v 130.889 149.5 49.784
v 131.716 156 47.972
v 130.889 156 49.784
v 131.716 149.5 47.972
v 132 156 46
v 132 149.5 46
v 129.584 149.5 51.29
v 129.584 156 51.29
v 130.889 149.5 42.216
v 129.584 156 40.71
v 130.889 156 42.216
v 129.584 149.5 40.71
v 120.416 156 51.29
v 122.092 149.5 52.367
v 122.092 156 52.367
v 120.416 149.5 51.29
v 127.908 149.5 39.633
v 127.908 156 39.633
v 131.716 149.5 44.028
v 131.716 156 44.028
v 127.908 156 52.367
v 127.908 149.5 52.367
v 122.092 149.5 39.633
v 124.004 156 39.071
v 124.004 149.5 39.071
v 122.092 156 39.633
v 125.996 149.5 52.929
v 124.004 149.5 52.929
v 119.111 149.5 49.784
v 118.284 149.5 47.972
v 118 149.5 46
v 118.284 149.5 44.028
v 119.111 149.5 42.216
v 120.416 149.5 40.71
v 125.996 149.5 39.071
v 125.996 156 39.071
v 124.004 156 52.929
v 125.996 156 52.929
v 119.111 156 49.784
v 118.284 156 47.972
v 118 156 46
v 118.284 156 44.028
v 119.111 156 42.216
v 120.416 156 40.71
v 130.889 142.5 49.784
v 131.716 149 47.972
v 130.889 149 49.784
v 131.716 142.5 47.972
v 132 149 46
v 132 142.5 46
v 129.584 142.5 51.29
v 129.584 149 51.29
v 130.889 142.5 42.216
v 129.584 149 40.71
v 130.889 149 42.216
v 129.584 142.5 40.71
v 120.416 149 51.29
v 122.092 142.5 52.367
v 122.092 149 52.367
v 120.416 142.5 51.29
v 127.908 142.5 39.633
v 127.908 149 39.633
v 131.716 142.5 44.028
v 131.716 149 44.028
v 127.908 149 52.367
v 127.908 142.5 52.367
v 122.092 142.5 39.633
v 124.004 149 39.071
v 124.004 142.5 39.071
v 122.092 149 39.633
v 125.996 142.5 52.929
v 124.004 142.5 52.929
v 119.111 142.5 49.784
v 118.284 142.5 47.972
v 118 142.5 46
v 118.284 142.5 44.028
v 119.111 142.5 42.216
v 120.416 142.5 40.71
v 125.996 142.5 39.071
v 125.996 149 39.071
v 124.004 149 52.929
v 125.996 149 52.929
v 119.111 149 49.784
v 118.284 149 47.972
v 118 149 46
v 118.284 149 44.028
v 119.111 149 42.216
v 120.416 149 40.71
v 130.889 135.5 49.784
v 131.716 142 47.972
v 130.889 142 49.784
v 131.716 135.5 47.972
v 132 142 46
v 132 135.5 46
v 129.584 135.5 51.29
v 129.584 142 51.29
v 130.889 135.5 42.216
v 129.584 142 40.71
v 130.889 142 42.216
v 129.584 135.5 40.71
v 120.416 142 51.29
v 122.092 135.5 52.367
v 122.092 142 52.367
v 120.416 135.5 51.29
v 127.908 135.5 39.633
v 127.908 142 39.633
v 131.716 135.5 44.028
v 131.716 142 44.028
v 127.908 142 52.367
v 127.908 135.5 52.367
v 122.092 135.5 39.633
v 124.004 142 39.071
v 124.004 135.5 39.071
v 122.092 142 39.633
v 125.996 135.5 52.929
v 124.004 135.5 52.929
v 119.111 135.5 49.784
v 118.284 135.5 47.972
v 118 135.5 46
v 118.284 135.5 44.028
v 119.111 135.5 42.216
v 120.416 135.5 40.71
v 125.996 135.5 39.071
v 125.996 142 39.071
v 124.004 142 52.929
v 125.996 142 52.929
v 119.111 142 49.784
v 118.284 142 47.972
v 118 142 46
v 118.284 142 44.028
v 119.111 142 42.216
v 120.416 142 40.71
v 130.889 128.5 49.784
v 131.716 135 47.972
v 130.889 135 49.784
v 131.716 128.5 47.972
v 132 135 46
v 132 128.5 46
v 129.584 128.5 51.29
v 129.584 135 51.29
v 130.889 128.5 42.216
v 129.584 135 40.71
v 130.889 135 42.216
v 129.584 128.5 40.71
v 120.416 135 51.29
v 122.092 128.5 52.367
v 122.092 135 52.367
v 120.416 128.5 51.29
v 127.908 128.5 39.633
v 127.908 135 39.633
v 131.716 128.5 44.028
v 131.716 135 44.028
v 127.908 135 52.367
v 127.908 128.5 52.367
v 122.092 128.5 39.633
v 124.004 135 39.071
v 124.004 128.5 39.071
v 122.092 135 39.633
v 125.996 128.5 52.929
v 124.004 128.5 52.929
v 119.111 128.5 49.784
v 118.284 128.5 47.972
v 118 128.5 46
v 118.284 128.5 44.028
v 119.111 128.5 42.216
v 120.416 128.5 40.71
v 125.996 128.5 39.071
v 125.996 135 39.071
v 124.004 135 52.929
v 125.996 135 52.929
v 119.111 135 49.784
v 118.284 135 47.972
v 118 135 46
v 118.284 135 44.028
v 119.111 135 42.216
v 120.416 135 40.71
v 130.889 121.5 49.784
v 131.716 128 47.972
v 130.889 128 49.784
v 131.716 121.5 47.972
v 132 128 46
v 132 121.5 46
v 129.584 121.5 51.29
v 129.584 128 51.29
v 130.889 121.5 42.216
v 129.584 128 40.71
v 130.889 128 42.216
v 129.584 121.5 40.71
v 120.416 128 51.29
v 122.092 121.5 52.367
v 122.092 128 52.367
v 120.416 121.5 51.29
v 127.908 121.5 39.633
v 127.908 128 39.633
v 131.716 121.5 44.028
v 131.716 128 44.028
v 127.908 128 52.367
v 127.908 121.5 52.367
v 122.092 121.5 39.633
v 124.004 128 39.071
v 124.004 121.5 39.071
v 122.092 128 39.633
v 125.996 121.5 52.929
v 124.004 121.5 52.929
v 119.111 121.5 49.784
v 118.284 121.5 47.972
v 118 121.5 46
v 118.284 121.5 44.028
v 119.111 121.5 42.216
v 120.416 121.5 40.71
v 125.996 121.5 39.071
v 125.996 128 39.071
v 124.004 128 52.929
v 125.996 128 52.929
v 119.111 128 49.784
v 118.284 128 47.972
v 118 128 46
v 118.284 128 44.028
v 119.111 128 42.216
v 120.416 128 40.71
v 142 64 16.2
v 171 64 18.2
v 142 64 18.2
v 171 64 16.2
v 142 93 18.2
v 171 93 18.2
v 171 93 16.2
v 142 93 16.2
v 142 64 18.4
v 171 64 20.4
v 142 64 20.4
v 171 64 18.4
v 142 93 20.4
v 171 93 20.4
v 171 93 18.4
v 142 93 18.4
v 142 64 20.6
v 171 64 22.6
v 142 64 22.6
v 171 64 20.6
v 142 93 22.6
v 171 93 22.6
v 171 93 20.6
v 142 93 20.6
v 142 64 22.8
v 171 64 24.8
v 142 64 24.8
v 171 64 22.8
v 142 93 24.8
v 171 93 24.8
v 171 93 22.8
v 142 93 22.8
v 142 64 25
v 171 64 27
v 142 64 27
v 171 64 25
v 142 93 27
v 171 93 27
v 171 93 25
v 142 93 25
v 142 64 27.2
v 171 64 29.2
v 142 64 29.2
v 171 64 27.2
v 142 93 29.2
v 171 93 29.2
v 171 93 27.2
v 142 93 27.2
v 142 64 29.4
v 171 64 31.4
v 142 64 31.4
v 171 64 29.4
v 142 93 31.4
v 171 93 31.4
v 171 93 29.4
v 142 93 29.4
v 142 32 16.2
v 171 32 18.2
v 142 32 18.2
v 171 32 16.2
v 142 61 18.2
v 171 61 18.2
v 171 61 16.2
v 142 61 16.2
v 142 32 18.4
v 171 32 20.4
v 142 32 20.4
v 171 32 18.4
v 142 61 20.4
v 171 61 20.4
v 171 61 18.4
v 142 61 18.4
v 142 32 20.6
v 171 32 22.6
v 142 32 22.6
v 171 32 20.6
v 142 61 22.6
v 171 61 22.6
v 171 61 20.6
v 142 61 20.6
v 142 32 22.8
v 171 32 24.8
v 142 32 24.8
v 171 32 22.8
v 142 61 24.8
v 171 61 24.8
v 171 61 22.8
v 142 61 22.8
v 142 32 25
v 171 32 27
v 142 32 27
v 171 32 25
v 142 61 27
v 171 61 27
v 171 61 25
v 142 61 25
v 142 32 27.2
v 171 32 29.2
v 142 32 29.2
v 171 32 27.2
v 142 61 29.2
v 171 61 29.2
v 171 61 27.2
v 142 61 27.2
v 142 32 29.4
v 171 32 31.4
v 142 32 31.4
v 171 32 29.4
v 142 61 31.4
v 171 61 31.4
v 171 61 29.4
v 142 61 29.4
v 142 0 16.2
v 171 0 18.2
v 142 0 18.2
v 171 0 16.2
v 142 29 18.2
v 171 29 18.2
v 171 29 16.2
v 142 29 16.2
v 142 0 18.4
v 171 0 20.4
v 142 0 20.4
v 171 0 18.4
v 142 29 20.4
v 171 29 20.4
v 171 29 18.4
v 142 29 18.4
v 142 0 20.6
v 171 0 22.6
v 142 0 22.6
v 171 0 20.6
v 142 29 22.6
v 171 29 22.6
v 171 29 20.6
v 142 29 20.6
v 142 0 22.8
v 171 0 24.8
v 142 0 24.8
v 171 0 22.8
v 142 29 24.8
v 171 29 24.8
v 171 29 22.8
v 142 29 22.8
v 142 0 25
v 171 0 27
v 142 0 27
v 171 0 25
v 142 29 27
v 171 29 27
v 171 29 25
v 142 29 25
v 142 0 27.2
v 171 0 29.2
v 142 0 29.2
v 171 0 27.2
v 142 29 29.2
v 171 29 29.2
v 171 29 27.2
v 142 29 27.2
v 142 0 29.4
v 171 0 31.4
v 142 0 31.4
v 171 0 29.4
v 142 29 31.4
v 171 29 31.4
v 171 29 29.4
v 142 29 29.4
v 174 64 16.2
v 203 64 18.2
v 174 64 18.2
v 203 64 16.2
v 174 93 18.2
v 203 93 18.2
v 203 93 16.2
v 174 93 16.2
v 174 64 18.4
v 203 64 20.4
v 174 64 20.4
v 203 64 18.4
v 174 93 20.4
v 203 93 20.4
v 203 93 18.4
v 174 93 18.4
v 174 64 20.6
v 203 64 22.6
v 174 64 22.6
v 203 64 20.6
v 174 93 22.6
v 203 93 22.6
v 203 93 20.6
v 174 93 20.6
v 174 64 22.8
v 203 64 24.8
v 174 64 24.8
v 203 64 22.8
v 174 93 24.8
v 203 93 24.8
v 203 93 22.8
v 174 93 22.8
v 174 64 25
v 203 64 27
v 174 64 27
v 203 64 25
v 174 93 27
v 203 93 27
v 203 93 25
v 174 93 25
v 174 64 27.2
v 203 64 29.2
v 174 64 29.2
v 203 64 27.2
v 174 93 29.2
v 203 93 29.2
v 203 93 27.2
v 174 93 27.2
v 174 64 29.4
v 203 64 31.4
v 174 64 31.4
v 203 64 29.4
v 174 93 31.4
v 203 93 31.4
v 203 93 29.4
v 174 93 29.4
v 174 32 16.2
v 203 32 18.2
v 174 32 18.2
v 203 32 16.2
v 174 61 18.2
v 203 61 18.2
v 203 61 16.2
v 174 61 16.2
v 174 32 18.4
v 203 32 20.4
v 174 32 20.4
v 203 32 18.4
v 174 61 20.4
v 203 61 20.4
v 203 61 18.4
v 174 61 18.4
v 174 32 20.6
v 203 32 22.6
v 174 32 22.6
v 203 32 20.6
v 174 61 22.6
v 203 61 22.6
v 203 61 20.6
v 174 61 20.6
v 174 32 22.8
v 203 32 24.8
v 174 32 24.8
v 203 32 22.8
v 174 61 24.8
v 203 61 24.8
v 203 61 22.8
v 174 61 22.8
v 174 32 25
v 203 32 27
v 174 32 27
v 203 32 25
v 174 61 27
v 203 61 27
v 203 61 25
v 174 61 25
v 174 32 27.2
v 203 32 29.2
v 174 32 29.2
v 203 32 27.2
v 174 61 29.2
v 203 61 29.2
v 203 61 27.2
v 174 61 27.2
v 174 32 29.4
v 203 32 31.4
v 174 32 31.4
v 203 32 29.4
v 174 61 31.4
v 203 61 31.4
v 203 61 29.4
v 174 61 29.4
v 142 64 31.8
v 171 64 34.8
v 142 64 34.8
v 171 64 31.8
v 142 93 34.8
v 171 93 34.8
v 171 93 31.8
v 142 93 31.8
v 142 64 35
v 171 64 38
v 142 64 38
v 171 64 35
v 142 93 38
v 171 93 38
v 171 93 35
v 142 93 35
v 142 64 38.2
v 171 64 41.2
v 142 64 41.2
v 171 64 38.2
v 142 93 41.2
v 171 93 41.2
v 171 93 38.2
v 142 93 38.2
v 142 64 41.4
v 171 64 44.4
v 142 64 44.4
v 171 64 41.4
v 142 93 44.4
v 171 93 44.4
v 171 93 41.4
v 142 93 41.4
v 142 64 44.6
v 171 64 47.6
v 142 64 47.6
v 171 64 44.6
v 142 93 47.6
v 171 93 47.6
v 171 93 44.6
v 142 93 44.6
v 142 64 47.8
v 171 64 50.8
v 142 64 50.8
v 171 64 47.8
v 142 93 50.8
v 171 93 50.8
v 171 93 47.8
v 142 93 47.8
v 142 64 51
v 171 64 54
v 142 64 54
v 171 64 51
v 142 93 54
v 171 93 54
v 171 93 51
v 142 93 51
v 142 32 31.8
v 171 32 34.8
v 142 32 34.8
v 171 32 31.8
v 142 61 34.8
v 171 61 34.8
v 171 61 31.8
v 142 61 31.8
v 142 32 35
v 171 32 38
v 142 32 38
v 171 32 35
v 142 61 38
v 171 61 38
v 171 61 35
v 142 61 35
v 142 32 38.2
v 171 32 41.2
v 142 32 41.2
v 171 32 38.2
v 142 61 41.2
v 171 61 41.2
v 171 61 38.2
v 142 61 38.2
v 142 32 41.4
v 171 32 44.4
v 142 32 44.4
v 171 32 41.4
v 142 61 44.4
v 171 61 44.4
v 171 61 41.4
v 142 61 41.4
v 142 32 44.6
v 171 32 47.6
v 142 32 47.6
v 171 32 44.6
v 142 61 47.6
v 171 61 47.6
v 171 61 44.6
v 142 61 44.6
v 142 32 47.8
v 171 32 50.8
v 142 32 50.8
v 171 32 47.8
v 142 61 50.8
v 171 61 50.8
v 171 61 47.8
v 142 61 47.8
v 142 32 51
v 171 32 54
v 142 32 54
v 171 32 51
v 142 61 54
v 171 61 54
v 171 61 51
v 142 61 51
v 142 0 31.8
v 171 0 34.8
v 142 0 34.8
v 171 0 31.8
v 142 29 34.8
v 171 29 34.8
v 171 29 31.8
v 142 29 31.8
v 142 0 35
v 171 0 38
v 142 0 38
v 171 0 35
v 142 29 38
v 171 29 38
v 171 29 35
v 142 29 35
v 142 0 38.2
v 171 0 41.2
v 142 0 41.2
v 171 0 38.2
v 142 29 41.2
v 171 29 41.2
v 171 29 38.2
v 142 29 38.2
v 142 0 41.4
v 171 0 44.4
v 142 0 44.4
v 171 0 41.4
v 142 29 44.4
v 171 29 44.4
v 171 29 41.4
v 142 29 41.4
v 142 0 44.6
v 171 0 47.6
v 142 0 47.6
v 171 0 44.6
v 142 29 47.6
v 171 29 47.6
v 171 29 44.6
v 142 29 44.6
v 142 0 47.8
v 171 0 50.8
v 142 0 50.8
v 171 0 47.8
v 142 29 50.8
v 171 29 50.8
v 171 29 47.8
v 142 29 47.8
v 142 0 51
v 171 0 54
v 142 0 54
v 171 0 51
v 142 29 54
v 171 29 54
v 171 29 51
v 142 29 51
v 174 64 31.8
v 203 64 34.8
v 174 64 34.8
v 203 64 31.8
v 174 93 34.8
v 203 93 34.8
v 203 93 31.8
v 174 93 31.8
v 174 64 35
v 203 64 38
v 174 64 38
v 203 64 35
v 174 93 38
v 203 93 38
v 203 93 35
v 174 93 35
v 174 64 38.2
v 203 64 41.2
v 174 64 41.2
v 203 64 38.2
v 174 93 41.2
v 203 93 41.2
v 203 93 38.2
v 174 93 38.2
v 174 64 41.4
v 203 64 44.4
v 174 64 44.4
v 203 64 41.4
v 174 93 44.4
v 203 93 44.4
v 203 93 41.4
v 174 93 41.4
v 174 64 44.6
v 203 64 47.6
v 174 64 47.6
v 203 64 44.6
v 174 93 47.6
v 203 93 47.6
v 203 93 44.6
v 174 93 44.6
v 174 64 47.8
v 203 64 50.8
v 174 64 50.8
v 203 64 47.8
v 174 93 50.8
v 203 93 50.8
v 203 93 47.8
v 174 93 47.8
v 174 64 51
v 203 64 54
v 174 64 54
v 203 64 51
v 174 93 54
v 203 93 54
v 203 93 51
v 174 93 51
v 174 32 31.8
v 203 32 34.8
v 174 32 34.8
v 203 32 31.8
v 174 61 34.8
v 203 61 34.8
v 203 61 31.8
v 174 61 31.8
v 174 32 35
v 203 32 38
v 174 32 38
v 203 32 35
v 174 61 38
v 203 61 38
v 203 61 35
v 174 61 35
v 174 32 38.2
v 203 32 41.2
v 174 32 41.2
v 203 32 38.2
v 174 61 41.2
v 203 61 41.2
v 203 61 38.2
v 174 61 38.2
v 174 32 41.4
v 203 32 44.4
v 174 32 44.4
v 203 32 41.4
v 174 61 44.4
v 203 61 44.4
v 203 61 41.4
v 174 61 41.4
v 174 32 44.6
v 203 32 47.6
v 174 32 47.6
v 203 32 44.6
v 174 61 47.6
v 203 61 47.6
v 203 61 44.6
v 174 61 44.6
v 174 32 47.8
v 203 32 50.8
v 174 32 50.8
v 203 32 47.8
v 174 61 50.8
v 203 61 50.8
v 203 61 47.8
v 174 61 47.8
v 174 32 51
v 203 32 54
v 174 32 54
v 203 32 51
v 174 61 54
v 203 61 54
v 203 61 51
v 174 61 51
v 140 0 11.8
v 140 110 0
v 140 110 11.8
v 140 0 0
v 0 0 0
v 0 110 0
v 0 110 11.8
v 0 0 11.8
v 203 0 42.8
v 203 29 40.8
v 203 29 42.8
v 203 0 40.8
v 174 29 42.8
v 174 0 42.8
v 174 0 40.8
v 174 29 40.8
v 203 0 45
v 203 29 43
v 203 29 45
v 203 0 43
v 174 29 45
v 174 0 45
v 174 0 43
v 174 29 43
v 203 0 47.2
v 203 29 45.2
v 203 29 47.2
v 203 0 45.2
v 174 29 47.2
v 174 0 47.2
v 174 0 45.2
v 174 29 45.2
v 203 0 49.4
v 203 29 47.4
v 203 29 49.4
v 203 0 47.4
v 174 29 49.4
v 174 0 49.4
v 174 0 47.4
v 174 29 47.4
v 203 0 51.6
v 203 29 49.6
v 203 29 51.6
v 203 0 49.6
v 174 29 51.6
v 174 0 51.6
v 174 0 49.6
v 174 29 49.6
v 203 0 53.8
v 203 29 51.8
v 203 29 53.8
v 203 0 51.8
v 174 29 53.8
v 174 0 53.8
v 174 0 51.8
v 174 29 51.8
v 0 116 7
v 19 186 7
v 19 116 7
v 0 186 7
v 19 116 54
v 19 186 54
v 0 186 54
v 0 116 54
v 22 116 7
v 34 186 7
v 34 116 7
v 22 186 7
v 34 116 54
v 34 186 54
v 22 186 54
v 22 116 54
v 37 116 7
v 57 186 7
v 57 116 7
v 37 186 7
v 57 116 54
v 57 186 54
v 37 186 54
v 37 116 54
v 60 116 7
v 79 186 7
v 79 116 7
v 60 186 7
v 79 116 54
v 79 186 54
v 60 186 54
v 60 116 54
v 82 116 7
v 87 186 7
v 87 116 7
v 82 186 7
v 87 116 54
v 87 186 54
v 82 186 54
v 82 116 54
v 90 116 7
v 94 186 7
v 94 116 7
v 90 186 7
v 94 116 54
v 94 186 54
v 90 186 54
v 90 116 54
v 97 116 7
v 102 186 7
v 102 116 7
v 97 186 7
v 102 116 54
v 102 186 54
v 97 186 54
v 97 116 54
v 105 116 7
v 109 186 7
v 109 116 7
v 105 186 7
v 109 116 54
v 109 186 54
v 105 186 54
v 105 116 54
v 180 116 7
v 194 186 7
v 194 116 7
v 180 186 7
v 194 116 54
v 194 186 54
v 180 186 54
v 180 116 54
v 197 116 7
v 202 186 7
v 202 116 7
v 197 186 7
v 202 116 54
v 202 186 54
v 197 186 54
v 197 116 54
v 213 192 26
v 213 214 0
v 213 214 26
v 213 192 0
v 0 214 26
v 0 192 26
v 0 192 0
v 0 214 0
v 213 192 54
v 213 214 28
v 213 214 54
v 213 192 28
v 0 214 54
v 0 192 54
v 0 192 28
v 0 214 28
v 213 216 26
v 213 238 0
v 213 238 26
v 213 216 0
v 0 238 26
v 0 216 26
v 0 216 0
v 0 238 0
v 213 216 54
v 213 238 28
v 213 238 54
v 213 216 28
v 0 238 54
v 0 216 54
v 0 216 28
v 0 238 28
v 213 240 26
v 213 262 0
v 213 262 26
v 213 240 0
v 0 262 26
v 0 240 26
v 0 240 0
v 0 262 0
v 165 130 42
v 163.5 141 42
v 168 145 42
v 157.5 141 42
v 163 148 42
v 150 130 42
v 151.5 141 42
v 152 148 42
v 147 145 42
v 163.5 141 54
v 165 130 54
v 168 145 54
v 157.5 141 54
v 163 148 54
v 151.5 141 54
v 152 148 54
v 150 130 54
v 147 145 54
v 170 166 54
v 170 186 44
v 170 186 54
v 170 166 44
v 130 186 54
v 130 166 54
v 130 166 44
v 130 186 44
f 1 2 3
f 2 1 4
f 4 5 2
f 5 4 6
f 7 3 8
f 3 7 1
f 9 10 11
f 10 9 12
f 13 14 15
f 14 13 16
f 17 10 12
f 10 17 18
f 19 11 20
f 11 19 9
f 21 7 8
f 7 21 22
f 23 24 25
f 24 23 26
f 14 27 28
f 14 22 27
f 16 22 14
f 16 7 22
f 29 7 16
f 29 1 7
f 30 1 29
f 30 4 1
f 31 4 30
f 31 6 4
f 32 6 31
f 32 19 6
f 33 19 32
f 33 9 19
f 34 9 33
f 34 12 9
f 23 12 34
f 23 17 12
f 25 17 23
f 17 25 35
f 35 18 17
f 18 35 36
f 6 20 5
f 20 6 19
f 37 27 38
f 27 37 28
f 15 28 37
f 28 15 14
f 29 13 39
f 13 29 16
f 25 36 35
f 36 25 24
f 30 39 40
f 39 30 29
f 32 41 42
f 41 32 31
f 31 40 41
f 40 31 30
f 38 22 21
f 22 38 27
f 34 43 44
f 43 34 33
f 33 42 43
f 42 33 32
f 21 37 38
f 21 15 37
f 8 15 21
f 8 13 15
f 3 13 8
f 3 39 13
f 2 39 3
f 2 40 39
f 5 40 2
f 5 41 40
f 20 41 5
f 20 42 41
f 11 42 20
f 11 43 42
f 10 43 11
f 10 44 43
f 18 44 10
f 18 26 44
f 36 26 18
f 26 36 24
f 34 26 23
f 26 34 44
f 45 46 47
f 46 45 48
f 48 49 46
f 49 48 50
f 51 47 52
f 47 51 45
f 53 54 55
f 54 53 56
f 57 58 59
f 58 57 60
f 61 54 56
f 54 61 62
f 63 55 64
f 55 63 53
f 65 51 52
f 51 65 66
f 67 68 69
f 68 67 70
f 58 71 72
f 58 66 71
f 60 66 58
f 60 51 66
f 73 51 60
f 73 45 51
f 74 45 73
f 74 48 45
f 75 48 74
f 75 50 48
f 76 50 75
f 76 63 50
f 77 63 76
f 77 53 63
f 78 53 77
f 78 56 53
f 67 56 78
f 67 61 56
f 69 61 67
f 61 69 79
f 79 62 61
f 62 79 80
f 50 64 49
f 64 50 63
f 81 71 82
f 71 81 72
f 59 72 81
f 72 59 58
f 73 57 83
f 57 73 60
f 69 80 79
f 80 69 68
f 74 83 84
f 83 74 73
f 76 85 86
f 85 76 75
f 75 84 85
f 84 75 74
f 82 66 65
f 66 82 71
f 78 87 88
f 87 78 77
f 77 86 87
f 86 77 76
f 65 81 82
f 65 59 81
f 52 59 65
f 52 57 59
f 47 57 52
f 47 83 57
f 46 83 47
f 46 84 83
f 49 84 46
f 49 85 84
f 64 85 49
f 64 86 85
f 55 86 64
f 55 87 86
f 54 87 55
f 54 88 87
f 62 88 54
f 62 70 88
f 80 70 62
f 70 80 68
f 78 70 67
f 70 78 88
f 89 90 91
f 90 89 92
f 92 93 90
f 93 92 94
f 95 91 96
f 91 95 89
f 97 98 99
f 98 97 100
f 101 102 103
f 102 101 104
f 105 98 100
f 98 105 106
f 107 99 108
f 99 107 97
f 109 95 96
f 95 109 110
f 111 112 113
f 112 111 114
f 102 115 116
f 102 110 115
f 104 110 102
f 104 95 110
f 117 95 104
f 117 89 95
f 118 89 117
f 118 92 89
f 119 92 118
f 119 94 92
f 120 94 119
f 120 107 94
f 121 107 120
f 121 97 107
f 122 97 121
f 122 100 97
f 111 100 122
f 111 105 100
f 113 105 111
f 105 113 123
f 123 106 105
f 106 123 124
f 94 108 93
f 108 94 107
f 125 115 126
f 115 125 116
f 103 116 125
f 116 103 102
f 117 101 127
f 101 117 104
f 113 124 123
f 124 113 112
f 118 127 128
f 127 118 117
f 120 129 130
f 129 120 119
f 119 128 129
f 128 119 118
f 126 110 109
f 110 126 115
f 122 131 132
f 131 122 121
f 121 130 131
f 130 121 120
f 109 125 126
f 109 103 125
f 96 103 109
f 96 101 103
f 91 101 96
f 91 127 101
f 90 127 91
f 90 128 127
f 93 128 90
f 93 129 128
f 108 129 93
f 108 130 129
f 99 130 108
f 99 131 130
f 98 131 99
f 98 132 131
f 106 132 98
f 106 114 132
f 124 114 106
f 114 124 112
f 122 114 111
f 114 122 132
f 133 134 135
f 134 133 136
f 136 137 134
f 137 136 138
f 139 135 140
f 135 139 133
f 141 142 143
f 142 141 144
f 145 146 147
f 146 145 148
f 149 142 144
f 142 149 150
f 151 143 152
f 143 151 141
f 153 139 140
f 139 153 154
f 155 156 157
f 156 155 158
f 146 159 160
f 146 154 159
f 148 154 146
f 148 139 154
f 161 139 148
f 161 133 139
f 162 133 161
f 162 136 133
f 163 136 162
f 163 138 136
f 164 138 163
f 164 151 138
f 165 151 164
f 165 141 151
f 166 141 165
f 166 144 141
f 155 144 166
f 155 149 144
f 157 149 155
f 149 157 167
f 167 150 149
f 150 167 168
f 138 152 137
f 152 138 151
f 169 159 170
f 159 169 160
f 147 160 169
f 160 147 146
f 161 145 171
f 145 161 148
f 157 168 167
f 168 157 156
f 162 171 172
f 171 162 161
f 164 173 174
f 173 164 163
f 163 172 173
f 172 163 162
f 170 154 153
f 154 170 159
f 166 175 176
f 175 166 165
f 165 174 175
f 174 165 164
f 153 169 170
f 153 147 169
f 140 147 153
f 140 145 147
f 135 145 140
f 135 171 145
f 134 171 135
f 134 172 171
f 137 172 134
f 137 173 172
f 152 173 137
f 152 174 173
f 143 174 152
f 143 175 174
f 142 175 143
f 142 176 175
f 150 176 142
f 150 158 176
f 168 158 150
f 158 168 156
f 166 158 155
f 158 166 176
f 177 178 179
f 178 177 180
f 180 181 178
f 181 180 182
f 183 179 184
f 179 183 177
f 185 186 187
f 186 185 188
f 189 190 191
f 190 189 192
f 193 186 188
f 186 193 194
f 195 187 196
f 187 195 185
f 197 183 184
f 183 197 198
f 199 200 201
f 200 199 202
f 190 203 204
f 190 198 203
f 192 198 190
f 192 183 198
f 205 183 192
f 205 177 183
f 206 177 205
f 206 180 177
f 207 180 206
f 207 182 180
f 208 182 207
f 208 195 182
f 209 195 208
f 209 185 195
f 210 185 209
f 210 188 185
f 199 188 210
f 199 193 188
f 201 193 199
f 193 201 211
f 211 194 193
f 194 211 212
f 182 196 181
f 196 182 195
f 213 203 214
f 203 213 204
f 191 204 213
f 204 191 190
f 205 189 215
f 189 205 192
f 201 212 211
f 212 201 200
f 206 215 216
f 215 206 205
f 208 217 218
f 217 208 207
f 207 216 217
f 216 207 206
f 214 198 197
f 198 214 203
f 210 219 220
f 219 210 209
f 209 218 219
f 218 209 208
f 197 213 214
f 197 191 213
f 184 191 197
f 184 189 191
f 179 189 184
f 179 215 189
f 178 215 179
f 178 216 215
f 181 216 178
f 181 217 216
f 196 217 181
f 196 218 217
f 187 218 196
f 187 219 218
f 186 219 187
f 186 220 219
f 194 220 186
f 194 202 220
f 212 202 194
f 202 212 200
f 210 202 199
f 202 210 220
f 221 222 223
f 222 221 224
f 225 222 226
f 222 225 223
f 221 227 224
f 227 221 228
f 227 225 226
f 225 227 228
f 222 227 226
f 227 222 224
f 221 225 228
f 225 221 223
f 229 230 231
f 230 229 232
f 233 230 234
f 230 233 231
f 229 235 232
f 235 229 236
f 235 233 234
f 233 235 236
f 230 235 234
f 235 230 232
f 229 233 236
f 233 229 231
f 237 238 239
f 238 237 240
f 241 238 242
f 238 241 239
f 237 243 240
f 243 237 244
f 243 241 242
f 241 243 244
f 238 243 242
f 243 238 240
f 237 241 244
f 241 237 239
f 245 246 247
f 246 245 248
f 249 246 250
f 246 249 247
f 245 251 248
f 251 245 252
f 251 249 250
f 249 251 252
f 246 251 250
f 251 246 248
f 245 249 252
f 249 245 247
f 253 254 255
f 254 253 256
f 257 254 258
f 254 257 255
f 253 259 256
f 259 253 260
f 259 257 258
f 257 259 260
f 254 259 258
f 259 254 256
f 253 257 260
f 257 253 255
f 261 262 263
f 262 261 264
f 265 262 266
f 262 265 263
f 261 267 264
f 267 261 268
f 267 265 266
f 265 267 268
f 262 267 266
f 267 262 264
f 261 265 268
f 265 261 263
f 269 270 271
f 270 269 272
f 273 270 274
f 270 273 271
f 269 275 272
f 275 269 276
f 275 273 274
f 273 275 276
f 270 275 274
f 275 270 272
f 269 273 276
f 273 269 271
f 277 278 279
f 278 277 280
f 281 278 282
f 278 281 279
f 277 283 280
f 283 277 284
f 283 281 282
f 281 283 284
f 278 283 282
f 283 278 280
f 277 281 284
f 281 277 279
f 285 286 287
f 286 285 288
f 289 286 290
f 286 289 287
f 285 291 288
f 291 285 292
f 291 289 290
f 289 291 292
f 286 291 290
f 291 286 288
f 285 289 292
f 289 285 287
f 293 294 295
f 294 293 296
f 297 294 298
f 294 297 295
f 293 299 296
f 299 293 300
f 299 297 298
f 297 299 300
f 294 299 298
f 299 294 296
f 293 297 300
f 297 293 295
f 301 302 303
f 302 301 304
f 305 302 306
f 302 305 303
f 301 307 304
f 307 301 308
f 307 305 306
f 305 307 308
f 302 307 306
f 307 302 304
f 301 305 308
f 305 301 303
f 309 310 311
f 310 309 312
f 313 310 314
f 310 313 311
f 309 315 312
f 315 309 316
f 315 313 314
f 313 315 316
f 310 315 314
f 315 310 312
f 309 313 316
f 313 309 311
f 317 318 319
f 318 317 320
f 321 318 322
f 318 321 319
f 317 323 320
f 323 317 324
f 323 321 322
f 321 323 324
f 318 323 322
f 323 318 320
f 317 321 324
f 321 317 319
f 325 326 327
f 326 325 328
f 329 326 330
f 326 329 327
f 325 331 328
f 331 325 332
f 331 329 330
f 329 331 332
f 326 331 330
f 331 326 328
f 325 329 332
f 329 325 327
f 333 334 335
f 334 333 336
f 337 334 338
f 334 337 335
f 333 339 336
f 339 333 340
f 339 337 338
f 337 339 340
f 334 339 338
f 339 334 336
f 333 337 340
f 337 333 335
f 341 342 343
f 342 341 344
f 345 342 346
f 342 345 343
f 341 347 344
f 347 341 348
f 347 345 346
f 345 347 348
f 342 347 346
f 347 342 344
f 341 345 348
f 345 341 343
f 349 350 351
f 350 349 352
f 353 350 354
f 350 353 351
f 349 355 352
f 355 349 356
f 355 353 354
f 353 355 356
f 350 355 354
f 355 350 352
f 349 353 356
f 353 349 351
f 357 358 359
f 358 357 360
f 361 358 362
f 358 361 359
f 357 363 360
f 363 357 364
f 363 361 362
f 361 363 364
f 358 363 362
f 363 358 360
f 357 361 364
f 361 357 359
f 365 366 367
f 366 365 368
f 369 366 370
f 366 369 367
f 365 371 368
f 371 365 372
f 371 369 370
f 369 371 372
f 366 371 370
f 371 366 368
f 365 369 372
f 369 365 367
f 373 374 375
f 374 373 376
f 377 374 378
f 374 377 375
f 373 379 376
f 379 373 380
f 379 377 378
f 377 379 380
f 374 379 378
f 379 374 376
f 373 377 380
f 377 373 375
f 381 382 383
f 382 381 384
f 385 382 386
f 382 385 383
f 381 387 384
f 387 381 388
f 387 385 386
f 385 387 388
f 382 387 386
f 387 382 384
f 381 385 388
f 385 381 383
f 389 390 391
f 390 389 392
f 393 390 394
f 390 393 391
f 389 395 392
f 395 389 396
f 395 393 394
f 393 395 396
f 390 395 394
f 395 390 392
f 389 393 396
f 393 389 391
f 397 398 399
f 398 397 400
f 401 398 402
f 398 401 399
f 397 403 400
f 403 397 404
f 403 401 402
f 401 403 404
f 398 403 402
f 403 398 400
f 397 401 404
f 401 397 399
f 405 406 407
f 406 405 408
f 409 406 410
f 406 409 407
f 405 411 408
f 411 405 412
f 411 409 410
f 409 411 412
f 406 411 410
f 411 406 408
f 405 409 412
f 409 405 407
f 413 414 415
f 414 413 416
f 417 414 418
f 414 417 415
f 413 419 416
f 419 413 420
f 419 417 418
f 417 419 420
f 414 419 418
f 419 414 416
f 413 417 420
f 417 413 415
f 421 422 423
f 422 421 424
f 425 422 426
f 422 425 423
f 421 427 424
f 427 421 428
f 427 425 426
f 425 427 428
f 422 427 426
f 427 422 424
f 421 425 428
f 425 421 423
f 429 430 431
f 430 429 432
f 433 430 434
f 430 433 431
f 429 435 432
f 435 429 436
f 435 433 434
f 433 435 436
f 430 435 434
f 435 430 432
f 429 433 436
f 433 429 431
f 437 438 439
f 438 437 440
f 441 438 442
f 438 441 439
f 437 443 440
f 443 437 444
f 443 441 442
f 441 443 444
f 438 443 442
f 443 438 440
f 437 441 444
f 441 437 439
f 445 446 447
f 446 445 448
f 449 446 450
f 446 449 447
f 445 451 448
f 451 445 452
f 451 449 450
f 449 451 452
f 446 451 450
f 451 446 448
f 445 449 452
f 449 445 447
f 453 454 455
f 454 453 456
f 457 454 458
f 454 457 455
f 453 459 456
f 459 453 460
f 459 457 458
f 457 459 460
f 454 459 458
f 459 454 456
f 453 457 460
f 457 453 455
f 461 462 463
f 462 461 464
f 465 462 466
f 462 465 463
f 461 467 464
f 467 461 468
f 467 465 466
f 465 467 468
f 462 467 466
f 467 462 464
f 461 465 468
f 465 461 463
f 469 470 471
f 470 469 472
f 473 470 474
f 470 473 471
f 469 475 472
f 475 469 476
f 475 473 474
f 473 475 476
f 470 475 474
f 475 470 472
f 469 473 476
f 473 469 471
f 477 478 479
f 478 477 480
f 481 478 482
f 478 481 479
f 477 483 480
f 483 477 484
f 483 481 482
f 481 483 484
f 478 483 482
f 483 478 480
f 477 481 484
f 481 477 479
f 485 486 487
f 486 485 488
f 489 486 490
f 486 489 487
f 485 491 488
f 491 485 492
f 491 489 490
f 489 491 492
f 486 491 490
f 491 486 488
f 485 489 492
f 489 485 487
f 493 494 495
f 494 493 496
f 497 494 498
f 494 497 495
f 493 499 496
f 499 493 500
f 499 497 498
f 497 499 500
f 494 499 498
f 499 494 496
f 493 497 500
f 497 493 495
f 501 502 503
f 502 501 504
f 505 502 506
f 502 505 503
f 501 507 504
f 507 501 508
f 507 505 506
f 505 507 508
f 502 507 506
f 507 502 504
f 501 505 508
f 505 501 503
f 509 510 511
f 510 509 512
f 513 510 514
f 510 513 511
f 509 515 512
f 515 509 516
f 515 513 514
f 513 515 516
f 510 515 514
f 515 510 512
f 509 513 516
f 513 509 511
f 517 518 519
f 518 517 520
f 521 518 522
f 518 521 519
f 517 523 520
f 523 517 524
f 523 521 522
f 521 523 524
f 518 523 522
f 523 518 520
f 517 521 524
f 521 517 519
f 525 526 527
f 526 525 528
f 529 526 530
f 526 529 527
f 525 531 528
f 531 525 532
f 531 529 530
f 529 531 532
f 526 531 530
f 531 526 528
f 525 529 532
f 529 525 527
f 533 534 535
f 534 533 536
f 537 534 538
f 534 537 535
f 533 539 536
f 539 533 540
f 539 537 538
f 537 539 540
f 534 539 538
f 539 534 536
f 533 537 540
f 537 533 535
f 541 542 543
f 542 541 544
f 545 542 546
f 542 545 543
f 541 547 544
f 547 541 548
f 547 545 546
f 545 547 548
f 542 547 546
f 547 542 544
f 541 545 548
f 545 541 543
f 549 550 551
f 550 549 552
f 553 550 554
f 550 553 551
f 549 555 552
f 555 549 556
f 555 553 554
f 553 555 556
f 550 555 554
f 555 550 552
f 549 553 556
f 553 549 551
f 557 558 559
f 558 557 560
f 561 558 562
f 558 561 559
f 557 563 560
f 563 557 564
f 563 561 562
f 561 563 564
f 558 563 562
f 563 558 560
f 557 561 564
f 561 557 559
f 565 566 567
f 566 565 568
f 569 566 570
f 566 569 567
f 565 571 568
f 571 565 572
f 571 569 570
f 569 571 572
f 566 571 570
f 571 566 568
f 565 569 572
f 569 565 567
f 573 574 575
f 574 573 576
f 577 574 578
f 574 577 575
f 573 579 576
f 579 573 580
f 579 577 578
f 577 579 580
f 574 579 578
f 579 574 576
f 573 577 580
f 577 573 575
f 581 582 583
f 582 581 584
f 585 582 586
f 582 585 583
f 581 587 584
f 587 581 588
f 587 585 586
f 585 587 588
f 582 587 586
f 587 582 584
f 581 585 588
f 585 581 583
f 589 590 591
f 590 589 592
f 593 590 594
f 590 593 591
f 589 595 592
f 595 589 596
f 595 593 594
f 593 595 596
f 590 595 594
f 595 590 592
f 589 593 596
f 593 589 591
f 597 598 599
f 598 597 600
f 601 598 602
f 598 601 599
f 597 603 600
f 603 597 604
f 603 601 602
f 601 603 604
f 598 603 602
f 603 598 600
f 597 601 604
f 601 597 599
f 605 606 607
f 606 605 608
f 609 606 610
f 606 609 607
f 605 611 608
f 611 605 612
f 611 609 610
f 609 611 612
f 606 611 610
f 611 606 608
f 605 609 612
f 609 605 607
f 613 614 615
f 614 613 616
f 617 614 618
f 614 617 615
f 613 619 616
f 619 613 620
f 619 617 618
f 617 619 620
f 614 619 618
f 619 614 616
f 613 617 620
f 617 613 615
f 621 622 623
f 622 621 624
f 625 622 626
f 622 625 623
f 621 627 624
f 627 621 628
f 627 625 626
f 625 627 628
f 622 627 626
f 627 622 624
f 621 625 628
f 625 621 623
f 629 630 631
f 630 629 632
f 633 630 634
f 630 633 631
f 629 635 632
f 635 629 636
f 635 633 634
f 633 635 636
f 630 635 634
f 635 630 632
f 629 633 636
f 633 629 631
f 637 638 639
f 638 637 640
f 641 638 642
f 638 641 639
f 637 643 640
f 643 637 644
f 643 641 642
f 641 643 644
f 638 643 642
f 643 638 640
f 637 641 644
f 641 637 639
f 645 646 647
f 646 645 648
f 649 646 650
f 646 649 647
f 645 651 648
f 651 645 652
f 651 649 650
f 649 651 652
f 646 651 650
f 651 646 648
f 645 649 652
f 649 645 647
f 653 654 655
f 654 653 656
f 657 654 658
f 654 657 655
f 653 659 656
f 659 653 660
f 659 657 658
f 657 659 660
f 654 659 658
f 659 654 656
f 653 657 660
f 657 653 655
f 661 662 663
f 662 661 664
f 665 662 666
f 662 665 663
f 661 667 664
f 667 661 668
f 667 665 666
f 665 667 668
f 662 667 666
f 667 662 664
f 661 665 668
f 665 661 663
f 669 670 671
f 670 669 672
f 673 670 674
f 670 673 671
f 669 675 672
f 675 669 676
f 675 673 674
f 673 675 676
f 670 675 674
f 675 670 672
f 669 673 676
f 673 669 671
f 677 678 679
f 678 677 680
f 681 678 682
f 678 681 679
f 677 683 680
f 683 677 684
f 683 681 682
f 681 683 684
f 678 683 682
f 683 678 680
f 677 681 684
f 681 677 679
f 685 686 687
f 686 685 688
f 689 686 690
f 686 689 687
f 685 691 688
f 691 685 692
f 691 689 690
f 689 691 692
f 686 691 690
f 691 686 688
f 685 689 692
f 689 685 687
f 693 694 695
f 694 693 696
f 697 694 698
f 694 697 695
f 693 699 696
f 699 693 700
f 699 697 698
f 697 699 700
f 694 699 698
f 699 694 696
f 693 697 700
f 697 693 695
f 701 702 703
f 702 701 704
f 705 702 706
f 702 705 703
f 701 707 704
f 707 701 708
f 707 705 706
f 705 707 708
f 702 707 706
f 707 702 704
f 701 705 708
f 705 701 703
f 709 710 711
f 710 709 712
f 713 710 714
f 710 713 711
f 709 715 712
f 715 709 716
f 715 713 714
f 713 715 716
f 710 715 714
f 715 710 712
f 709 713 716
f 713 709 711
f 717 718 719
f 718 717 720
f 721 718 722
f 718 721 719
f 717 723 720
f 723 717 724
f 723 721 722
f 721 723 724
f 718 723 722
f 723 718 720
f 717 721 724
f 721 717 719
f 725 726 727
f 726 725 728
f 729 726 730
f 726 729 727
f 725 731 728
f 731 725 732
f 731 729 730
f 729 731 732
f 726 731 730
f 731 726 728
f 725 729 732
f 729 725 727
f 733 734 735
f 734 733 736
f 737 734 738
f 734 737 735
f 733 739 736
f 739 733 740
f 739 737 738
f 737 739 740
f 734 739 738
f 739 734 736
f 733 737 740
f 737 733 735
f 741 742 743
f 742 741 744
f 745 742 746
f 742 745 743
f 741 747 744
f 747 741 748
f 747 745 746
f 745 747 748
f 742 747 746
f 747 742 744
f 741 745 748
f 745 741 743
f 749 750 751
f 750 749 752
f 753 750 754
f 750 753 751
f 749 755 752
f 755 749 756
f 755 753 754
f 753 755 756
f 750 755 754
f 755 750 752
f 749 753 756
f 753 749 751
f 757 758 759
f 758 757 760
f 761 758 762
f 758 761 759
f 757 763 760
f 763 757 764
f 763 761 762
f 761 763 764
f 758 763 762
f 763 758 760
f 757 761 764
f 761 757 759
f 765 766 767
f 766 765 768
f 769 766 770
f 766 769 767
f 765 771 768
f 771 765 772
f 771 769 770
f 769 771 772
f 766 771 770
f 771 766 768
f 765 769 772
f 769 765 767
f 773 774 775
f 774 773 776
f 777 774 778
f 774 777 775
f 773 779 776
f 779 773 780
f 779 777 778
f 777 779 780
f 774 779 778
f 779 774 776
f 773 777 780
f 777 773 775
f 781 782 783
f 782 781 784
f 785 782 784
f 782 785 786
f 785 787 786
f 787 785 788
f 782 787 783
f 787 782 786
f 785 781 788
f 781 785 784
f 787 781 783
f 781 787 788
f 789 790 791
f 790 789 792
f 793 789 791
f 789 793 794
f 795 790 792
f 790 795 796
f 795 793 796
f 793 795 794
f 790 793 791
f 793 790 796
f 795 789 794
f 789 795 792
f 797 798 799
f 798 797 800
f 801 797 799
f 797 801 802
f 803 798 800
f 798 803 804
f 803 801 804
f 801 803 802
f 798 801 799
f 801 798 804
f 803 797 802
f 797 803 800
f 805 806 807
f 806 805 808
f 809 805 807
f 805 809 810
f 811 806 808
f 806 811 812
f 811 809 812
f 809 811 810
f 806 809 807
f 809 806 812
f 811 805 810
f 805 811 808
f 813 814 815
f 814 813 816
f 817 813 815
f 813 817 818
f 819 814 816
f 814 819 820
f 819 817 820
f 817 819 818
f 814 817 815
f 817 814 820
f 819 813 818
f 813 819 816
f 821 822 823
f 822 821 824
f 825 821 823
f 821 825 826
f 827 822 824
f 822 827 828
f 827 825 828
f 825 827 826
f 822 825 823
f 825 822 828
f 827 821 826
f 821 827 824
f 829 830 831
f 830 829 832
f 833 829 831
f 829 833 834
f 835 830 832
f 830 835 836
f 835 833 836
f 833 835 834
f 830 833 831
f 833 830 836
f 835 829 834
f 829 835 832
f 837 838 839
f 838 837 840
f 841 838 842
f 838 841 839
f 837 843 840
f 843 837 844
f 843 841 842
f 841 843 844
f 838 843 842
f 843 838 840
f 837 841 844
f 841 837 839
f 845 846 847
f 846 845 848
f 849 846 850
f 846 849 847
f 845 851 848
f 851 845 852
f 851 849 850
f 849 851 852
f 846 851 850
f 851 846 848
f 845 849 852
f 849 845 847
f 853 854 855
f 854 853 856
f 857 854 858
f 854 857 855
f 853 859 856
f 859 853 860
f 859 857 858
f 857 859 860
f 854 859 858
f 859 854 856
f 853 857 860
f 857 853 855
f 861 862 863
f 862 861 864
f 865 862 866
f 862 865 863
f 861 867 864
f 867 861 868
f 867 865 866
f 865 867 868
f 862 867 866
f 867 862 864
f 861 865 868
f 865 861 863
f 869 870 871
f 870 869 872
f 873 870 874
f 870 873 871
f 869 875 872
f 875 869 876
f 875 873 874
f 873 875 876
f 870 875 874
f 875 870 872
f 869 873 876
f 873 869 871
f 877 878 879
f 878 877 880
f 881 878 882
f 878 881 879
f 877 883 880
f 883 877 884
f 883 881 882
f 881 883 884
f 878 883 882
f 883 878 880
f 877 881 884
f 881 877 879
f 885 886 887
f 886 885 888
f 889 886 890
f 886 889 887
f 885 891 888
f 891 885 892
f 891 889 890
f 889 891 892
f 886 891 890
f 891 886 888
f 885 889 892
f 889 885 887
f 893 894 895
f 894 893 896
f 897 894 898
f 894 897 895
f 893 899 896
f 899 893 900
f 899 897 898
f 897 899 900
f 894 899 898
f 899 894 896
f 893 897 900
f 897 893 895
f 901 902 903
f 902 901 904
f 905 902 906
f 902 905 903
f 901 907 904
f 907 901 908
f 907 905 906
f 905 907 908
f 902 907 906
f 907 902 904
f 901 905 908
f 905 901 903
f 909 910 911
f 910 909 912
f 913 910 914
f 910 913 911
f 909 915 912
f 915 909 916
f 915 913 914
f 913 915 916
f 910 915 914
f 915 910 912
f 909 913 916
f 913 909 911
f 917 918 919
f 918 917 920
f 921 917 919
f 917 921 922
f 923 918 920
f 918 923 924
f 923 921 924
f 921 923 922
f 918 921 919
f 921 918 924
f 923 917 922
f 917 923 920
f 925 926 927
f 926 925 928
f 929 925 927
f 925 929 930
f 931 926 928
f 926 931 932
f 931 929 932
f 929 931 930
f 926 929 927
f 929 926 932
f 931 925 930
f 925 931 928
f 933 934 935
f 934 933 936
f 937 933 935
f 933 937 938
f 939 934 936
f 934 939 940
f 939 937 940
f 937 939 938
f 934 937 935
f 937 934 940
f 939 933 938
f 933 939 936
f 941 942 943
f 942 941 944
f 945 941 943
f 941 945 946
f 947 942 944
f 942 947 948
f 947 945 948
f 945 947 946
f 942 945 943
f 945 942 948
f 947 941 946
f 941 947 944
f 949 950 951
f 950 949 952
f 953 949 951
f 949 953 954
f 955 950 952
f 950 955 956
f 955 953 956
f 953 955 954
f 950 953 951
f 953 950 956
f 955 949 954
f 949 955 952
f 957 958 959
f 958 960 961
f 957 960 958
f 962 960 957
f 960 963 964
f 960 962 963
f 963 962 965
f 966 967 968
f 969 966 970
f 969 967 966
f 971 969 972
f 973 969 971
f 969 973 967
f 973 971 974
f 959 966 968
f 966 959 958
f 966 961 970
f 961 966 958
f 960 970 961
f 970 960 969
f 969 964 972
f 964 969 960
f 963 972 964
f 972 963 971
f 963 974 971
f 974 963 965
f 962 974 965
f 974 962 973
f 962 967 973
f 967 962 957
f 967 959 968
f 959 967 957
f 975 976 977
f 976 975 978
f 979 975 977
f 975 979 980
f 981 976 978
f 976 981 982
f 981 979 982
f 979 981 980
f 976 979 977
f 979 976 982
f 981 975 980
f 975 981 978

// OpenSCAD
renderGameBox = false;
renderBoard = false;
renderRules = false;
renderPawns = true;
renderTiles = true;
renderPlayersBoard = true;
renderTokens = false;
renderScoringTiles = true;
renderSpellCards = true;
renderTraitCards = true;
renderAutomatCards = true;
renderAutomatLocationCards = true;
renderGoonsCards = true;
renderItemsCards = true;
renderPlayerHelpCards = true;
renderLeaderCards = true;
renderEndGameCards = true;
renderInstantCards = true;
renderCrown = true;
renderHorn = true;
renderBreakoutExpansion = false;
renderTilesHolders = true;

playersColors = [
    "Green", 
    "Red", 
    "Purple", 
    "MediumSlateBlue", 
    "Yellow"
    ];


tokensColors = [
    "Gold",
    "CornflowerBlue",
    "Silver",
    "Chartreuse"
];
automatColor = "DarkGray";
spellCardsColor = "SlateBlue";
traitCardsColor = "AntiqueWhite";
automatCardsColor = "MidnightBlue";
automatLocationCardsColor = "PaleTurquoise";
goonCardsColor = "LimeGreen";
itemCardsColor = "Thistle";
playerHelpCardsColor = "DarkSlateGray";
leaderCardsColor = "Black";
endGameCardsColor = "DimGray";
instantCardsColor = "Gray";
crownColor = "Gold";
hornColor = "FloralWhite";
breakoutColor = "Navy";

cardGap = 3;
topAlignment = 28 + 26;

module tile(color, acrylic) {
    echo("Generating ", color, " tile", "acrylic", acrylic);
    width = 29;
    depth = width;
    color(color) {
        if(acrylic) {
            cube([width, depth, 3]);
        } else {
            cube([width, depth, 2]);
        }
    }
}

module playerTilesSet(color, acrylic) {
    echo("Generating acrylic tiles set for player", color, "acrylic", acrylic);
    tilesQty = 7;
    if (acrylic) {
        translate([0,0,-3.2]) {
            for (a = [1:tilesQty]) {
                translate([0,0,3.2*a]) {
                    tile(color, acrylic);
                }
            }
        }
    } else {
        for (a = [1:tilesQty]) {
            translate([0,0,2.2*(a-1)]) {
                tile(color, acrylic);
            }
        }
    }
}

module playersTilesSet(acrylic = false) {
    echo("Generating players tiles set - acrylic", acrylic);
    for (a = [1:len(playersColors)]) {
        b = floor((a-1)/3);
        c = (a-1)%3;
        translate([c*32, b*32, 0]) {
            playerTilesSet(playersColors[a-1], acrylic);
        }
    }
}

module playersScoringTiles() {
    echo("Generating players scoring tiles set");
    for (a = [1:len(playersColors)]) {
        translate([0, 0, (a-1)*2.2]) {
            tile(playersColors[a-1], false);
        }
    }
    translate([0, 0, len(playersColors) * 2.2]) {
        tile(automatColor, false);
    }
}
module playerBoard(color) {
    echo("Generating ", color, " board");
    width = 140;
    depth = 110;
    height = 2;
    color(color) {
        cube([width, depth, 3]);
    }
}

module playersBoard() {
    echo("Generating players board");
    translate([0,0,-2.2]) {
        for (a = [1:len(playersColors)]) {
            translate([0,0,2.2*a]) {
                playerBoard(playersColors[a-1]);
            }
        }
    }
}

module pawn(color) {
    echo("Generating ", color, " pawn");
    radius = 3.5;
    height = 6.5;
    
    color(color) {
        cylinder(height, radius * 2, radius * 2);
    }
}

module pawnsSet() {
    echo("Generating pawns set");
    translate([0,0,-7]) {
        for (a = [1:len(playersColors)]) {
            translate([0,0,7*a]) {
                pawn(playersColors[a-1]);
            }
        }
    }
}
module token(color) {
    echo("Generating token", color);
    width = 10;
    depth = width;
    height = width;
    
    color (color) {
        cube([width, depth, height]);
    }
}

module tokensSet(color) {
    tokenQty = 25;
    translate([-10.2, 0, 0]) {
        for (a = [1:tokenQty]) {
            translate([10.2 * a, 0, 0]) {
                token(color);
            }
        }
    }
}

module allTokens() {
    echo("Generating all tokens");
    translate([0, -10.2, 0]) {
        for (a = [1:len(tokensColors)]) {
            translate([0, 10.2 * a, 0]) {
                tokensSet(tokensColors[a-1]);
            }
        }
    }
}

module spellCards(sleeved = false) {
    color(spellCardsColor) {
        if (sleeved) {
            width = 47;
            depth = 70;
            height = 19;
            cube([width, depth, height]);
        } else {
            echo("ATTENTION: Please provide dimensions for non-sleeved spells cards");
        }
    }
}
module traitCards(sleeved = false) {
    color(traitCardsColor) {
        if (sleeved) {
            width = 47;
            depth = 70;
            height = 12;
            cube([width, depth, height]);
        } else {
            echo("ATTENTION: Please provide dimensions for non-sleeved trait cards");
        }
    }
}
module automatCards(sleeved = false) {
    color(automatCardsColor) {
        if (sleeved) {
            width = 47;
            depth = 70;
            height = 14;
            cube([width, depth, height]);
        } else {
            echo("ATTENTION: Please provide dimensions for non-sleeved automat cards");
        }
    }
}
module automatLocationCards(sleeved = false) {
    echo("Generating automat location cards");
    color(automatLocationCardsColor) {
        if (sleeved) {
            width = 47;
            depth = 70;
            height = 5;
            cube([width, depth, height]);
        } else {
            echo("ATTENTION: Please provide dimensions for non-sleeved automat location cards");
        }
    }
}
module playerHelpCards(sleeved = false) {
    color(playerHelpCardsColor) {
        if (sleeved) {
            width = 47;
            depth = 70;
            height = 4;
            cube([width, depth, height]);
        } else {
            echo("ATTENTION: Please provide dimensions for non-sleeved player help cards");
        }
    }
}
module goonCards(sleeved = false) {
    color(goonCardsColor) {
        if (sleeved) {
            width = 47;
            depth = 70;
            height = 20;
            cube([width, depth, height]);
        } else {
            echo("ATTENTION: Please provide dimensions for non-sleeved goon cards");
        }
    }
}
module itemCards(sleeved = false) {
    color(leaderCardsColor) {
        if (sleeved) {
            width = 47;
            depth = 70;
            height = 19;
            cube([width, depth, height]);
        } else {
            echo("ATTENTION: Please provide dimensions for non-sleeved item cards");
        }
    }
}
module leaderCards(sleeved = false) {
    color(leaderCardsColor) {
        if (sleeved) {
            width = 47;
            depth = 70;
            height = 5;
            cube([width, depth, height]);
        } else {
            echo("ATTENTION: Please provide dimensions for non-sleeved leader cards");
        }
    }
}
module endGameCards(sleeved = false) {
    color(endGameCardsColor) {
        if (sleeved) {
            width = 47;
            depth = 70;
            height = 4;
            cube([width, depth, height]);
        } else {
            echo("ATTENTION: Please provide dimensions for non-sleeved end game cards");
        }
    }
}
module instantCards(sleeved = false) {
    color(instantCardsColor) {
        if (sleeved) {
            width = 47;
            depth = 70;
            height = 5;
            cube([width, depth, height]);
        } else {
            echo("ATTENTION: Please provide dimensions for non-sleeved instant cards");
        }
    }
}
module crown() {
    echo("Generating crown");
    color(crownColor) {
        linear_extrude(12) {
            points = [[0,0], [15,0], [((21-15)/2)+15, 15], [13.5,11], [13,18], [15/2,11], [2,18], [1.5,11], [(-(21-15)/2), 15]];
            polygon(points);
        }
    }
}
module horn() {
    echo("Generating horn");
    width = 40;
    depth = 20;
    height = 10;
    
    color(hornColor) {
        cube([width, depth, height]);
    }
}
module breakout() {
    echo("Generating Breakout expansion box");
    width = 213;
    depth = 146;
    height = 48;
    
    color(breakoutColor) {
        cube([width, depth, height]);
    }
}
module tilesHolder(color) {
    width = 213;
    depth = 22;
    height = 26;
    
    color(color) {
        cube([width, depth, height]);
    }
}
module tilesHolders() {
    echo("Generating tiles holders set");
    for (a = [1:len(playersColors)]) {
        b = floor((a-1)/2);
        c = (a-1)%2;
        translate([0,b*24,c*28]) {
            tilesHolder(playersColors[a-1]);
        }
    }
}
module rules() {
    echo("Generating rules");
    width = 206;
    depth = 297;
    height = 1;
    color = "MediumPurple";
    
    color(color) {
        cube([width, depth, height]);
    }
}

module board() {
    echo("Generating board");
    width = 208;
    depth = 298;
    height = 10;
    color = "Tan";

    color(color) {
        cube([width, depth, height]);
    }
}

module gameBox() {
    echo("Generating game box");
    difference() {
        gameBoxOuter();
        translate([2,2,2]) {
            gameBoxInner();
        }
    }
}

module gameBoxOuter() {
    echo("Generating outer game box");
    width = 220;
    depth = 311;
    height = 72;
    
    cube([width, depth, height]);
}

module gameBoxInner() {
    echo("Generating inner game box");
    width = 216;
    depth = 307;
    height = 70;
    
    cube([width, depth, height]);
}

if(renderGameBox) {
    translate([-4,-4,-2]) {
        gameBox();
    }
}
if(renderBoard) {
    translate([6,6,60]) {
        board();
    }
}
if(renderRules) {
    translate([6,6,70]) {
        rules();
    }
}
if(renderPawns) {
    translate([19 + cardGap + 12 + cardGap + 20 + cardGap + 19 + cardGap + 5 + cardGap + 4 + cardGap + 5 + cardGap + 20, 110 + 6 + (70/2) + 5, topAlignment - 3.5*2 - 1]) {
        rotate([90,0,0]) {
            pawnsSet();
        }
    }
}
if(renderTiles) {
    translate([142, 32+32+29, topAlignment-(7*3.2)-(7*2.2)]) {
        rotate([0,0,270]) {
            playersTilesSet();
            translate([0, 0, 15.6]) {
                playersTilesSet(true);
            }
        }
    }
}
if(renderPlayersBoard) {
    playersBoard();
}
if(renderTokens) {
    translate([200,0,0]) {
        allTokens();
    }
}
if(renderScoringTiles) {
    translate([142+32, 0, topAlignment - (6*2.2)]) {
        playersScoringTiles();
    }
}
translate([0,110+6,topAlignment]) {
if(renderSpellCards) {
    rotate([0,90,0]) {
        spellCards(true);
    }
}
if(renderTraitCards) {
    translate([19 + cardGap, 0, 0]) {
        rotate([0,90,0]) {
            traitCards(true);
        }
    }
}
if(renderGoonsCards) {
    translate([19 + cardGap + 12 + cardGap, 0, 0]) {
        rotate([0,90,0]) {
            goonCards(true);
        }
    }
}
if(renderItemsCards) {
    translate([19 + cardGap + 12 + cardGap + 20 + cardGap, 0, 0]) {
        rotate([0,90,0]) {
        itemCards(true);
        }
    }
}
if(renderLeaderCards) {
    translate([19 + cardGap + 12 + cardGap + 20 + cardGap + 19 + cardGap, 0, 0]) {
        rotate([0,90,0]) {
            leaderCards(true);
        }
    }
}
if(renderEndGameCards) {
    translate([19 + cardGap + 12 + cardGap + 20 + cardGap + 19 + cardGap + 5 + cardGap, 0, 0]) {
        rotate([0,90,0]) {
            endGameCards(true);
        }
    }
}
if(renderInstantCards) {
    translate([19 + cardGap + 12 + cardGap + 20 + cardGap + 19 + cardGap + 5 + cardGap + 4 + cardGap, 0, 0]) {
        rotate([0,90,0]) {
            instantCards(true);
        }
    }
}

if(renderPlayerHelpCards) {
    translate([19 + cardGap + 12 + cardGap + 20 + cardGap + 19 + cardGap + 5 + cardGap + 4 + cardGap + 5 + cardGap, 0, 0]) {
        rotate([0,90,0]) {
            playerHelpCards(true);
        }
    }
}
if(renderAutomatCards) {
    translate([120+19 + cardGap + 12 + cardGap + 20 + cardGap, 0, 0]) {
        rotate([0,90,0]) {
            automatCards(true);
        }
    }
}
if(renderAutomatLocationCards) {
    translate([120+19 + cardGap + 12 + cardGap + 20 + cardGap + 14 + cardGap, 0, 0]) {
        rotate([0,90,0]) {
            automatLocationCards(true);
        }
    }
}
}
if(renderCrown) {
    translate([150, 130, topAlignment-12]) {
        crown();
    }
}
if(renderHorn) {
    translate([130,110+6+70-20, topAlignment-10]) {
        horn();
    }
}
if(renderBreakoutExpansion) {
    translate([0,307-2-146,topAlignment-48]) {
        breakout();
    }
}
if(renderTilesHolders) {
    translate([0,110+6+70+6,0]) {
        tilesHolders();
    }
}
